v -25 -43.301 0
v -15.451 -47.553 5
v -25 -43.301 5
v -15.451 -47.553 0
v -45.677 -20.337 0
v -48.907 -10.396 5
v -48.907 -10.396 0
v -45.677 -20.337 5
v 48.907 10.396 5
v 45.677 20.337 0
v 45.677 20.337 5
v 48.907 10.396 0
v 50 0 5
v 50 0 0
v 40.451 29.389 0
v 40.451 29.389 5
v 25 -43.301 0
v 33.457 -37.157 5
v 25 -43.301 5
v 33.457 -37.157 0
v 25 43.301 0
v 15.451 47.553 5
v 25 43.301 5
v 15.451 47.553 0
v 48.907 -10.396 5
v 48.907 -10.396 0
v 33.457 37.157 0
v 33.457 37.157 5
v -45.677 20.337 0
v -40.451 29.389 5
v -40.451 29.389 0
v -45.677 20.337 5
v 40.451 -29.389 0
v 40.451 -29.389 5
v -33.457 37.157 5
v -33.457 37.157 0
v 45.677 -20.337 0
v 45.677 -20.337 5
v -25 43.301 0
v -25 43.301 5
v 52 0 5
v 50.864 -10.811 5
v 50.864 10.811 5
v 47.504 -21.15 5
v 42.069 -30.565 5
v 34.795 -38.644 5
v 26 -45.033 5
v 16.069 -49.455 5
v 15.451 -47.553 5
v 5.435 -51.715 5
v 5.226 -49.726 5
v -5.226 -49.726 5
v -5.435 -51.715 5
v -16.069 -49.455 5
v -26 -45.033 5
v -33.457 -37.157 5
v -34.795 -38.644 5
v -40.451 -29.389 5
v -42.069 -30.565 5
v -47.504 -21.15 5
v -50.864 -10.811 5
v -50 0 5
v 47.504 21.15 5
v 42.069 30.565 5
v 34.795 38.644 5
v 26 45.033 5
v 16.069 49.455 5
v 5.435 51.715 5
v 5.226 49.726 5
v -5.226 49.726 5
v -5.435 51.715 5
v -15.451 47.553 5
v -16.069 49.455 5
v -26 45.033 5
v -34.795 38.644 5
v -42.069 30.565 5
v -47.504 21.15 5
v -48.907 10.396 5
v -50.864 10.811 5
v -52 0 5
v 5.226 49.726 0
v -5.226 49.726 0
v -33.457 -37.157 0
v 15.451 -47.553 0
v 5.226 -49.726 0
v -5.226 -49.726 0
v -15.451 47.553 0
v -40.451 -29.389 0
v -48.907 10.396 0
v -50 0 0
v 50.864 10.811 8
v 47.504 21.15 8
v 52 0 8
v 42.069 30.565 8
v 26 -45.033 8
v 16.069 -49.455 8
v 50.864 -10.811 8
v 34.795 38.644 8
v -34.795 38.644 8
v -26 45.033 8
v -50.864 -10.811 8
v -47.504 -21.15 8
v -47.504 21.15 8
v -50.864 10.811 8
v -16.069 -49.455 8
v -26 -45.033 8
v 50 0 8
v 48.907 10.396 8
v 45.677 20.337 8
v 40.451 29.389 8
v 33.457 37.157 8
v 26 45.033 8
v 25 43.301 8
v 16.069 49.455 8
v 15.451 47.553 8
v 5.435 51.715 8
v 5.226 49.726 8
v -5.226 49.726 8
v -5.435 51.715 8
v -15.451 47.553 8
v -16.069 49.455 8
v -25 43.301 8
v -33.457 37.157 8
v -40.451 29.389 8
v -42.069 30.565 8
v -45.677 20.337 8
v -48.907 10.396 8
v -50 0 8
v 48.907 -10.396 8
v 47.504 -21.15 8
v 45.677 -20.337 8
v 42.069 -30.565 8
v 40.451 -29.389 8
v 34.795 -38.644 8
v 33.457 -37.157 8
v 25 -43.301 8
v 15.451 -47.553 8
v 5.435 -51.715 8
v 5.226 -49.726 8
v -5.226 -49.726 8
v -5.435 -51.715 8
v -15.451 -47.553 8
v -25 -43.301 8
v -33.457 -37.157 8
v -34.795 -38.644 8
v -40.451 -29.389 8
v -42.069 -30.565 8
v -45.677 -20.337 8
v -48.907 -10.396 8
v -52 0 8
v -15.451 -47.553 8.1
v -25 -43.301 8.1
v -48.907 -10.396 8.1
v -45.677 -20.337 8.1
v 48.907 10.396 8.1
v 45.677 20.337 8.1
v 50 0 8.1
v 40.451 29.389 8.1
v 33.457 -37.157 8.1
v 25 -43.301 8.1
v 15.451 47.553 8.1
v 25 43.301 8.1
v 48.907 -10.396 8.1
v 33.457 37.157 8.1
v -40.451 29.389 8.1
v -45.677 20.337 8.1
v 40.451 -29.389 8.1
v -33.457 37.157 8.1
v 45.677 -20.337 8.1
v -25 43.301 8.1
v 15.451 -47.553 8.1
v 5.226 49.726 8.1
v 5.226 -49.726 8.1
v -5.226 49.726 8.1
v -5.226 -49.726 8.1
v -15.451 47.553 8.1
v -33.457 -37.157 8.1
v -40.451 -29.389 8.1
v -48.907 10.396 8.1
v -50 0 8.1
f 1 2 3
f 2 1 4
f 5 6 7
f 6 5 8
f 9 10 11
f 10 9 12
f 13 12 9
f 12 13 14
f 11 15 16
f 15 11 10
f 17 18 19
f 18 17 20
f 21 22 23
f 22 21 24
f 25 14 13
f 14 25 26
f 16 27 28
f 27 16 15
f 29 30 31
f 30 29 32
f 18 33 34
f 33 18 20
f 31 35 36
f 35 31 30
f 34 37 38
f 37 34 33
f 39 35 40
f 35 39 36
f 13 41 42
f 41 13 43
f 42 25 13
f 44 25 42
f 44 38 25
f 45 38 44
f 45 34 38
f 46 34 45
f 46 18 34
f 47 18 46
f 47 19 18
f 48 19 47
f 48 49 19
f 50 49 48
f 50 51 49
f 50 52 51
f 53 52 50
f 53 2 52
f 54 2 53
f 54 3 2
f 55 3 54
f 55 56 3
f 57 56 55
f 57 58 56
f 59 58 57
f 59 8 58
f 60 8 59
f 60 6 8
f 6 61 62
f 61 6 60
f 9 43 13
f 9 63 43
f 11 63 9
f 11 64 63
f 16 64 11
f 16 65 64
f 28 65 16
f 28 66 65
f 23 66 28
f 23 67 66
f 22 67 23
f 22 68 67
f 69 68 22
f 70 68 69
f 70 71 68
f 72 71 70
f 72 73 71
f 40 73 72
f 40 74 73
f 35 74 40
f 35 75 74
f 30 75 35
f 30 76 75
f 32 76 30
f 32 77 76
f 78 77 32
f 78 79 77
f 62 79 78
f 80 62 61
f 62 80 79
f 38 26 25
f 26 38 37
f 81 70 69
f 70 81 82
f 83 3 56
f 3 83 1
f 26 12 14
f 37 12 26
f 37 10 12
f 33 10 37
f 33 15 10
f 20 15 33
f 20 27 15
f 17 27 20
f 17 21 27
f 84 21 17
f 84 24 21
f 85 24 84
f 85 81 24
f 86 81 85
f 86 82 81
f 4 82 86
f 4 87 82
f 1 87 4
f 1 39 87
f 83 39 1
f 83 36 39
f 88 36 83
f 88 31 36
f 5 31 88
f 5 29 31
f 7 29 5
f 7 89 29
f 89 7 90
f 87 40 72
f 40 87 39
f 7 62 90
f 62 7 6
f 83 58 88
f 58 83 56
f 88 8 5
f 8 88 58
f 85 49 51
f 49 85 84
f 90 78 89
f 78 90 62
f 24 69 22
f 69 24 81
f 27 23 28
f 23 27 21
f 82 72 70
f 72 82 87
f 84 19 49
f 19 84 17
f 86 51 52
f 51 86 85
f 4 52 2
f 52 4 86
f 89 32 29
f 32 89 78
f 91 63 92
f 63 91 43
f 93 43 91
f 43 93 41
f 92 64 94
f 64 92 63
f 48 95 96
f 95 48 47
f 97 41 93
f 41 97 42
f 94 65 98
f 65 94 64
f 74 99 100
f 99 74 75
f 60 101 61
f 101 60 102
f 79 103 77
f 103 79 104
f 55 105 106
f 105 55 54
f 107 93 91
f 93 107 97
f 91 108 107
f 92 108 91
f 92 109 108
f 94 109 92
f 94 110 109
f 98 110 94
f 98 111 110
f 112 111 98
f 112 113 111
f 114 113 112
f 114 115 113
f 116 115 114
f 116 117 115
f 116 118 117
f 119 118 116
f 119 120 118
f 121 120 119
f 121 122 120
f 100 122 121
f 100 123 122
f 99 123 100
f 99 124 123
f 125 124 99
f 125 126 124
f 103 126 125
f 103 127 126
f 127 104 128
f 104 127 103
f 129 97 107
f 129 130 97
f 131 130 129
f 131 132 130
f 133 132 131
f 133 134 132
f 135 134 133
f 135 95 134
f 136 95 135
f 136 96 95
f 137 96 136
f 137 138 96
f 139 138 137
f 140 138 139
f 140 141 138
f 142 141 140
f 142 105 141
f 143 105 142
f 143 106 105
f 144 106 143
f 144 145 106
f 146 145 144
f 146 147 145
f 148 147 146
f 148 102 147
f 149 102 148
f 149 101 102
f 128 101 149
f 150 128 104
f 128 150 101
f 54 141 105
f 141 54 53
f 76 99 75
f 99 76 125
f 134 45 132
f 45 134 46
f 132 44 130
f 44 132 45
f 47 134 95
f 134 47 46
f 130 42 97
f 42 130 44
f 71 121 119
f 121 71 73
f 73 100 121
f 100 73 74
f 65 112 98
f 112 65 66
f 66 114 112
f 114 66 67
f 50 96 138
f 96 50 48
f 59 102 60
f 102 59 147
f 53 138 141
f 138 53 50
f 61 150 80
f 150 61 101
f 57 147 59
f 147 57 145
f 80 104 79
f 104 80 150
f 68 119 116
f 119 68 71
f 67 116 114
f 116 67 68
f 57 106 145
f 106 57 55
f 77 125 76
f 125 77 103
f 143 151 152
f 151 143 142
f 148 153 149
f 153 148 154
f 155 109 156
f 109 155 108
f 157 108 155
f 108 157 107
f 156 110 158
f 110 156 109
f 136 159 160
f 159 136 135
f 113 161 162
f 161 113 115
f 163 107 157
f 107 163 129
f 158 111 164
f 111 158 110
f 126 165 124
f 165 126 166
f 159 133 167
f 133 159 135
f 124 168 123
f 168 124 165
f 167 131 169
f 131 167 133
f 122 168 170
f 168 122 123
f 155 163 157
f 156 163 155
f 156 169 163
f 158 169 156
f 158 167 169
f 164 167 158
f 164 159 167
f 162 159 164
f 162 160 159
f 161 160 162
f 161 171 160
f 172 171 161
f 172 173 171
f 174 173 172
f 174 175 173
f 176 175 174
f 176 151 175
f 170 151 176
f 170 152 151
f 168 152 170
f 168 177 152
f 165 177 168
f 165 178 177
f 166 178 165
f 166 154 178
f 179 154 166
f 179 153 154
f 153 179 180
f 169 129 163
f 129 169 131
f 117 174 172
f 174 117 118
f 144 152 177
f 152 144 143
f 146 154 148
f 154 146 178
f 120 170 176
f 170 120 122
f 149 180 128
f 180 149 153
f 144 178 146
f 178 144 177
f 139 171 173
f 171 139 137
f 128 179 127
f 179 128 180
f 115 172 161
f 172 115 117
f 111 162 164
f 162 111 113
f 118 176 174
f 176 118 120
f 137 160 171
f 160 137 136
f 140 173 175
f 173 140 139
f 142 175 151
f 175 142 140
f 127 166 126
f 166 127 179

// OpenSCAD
// Parameters
coaster_radius = 50; // Radius of the coaster's base
coaster_thickness = 5; // Thickness of the coaster
edge_height = 3; // Height of the raised edge
edge_thickness = 2; // Thickness of the raised edge

// Coaster Base
module coaster() {
    // Base of the coaster
    cylinder(h = coaster_thickness, r = coaster_radius);
  
    // Raised Edge
    translate([0, 0, coaster_thickness])
        cylinder(h = edge_height, r = coaster_radius + edge_thickness);
        
    // Subtract Inner Circle to create actual edge
    translate([0, 0, coaster_thickness])
        cylinder(h = edge_height + 0.1, r = coaster_radius); // +0.1 to ensure clean subtraction
}

// Call the coaster module
coaster();
